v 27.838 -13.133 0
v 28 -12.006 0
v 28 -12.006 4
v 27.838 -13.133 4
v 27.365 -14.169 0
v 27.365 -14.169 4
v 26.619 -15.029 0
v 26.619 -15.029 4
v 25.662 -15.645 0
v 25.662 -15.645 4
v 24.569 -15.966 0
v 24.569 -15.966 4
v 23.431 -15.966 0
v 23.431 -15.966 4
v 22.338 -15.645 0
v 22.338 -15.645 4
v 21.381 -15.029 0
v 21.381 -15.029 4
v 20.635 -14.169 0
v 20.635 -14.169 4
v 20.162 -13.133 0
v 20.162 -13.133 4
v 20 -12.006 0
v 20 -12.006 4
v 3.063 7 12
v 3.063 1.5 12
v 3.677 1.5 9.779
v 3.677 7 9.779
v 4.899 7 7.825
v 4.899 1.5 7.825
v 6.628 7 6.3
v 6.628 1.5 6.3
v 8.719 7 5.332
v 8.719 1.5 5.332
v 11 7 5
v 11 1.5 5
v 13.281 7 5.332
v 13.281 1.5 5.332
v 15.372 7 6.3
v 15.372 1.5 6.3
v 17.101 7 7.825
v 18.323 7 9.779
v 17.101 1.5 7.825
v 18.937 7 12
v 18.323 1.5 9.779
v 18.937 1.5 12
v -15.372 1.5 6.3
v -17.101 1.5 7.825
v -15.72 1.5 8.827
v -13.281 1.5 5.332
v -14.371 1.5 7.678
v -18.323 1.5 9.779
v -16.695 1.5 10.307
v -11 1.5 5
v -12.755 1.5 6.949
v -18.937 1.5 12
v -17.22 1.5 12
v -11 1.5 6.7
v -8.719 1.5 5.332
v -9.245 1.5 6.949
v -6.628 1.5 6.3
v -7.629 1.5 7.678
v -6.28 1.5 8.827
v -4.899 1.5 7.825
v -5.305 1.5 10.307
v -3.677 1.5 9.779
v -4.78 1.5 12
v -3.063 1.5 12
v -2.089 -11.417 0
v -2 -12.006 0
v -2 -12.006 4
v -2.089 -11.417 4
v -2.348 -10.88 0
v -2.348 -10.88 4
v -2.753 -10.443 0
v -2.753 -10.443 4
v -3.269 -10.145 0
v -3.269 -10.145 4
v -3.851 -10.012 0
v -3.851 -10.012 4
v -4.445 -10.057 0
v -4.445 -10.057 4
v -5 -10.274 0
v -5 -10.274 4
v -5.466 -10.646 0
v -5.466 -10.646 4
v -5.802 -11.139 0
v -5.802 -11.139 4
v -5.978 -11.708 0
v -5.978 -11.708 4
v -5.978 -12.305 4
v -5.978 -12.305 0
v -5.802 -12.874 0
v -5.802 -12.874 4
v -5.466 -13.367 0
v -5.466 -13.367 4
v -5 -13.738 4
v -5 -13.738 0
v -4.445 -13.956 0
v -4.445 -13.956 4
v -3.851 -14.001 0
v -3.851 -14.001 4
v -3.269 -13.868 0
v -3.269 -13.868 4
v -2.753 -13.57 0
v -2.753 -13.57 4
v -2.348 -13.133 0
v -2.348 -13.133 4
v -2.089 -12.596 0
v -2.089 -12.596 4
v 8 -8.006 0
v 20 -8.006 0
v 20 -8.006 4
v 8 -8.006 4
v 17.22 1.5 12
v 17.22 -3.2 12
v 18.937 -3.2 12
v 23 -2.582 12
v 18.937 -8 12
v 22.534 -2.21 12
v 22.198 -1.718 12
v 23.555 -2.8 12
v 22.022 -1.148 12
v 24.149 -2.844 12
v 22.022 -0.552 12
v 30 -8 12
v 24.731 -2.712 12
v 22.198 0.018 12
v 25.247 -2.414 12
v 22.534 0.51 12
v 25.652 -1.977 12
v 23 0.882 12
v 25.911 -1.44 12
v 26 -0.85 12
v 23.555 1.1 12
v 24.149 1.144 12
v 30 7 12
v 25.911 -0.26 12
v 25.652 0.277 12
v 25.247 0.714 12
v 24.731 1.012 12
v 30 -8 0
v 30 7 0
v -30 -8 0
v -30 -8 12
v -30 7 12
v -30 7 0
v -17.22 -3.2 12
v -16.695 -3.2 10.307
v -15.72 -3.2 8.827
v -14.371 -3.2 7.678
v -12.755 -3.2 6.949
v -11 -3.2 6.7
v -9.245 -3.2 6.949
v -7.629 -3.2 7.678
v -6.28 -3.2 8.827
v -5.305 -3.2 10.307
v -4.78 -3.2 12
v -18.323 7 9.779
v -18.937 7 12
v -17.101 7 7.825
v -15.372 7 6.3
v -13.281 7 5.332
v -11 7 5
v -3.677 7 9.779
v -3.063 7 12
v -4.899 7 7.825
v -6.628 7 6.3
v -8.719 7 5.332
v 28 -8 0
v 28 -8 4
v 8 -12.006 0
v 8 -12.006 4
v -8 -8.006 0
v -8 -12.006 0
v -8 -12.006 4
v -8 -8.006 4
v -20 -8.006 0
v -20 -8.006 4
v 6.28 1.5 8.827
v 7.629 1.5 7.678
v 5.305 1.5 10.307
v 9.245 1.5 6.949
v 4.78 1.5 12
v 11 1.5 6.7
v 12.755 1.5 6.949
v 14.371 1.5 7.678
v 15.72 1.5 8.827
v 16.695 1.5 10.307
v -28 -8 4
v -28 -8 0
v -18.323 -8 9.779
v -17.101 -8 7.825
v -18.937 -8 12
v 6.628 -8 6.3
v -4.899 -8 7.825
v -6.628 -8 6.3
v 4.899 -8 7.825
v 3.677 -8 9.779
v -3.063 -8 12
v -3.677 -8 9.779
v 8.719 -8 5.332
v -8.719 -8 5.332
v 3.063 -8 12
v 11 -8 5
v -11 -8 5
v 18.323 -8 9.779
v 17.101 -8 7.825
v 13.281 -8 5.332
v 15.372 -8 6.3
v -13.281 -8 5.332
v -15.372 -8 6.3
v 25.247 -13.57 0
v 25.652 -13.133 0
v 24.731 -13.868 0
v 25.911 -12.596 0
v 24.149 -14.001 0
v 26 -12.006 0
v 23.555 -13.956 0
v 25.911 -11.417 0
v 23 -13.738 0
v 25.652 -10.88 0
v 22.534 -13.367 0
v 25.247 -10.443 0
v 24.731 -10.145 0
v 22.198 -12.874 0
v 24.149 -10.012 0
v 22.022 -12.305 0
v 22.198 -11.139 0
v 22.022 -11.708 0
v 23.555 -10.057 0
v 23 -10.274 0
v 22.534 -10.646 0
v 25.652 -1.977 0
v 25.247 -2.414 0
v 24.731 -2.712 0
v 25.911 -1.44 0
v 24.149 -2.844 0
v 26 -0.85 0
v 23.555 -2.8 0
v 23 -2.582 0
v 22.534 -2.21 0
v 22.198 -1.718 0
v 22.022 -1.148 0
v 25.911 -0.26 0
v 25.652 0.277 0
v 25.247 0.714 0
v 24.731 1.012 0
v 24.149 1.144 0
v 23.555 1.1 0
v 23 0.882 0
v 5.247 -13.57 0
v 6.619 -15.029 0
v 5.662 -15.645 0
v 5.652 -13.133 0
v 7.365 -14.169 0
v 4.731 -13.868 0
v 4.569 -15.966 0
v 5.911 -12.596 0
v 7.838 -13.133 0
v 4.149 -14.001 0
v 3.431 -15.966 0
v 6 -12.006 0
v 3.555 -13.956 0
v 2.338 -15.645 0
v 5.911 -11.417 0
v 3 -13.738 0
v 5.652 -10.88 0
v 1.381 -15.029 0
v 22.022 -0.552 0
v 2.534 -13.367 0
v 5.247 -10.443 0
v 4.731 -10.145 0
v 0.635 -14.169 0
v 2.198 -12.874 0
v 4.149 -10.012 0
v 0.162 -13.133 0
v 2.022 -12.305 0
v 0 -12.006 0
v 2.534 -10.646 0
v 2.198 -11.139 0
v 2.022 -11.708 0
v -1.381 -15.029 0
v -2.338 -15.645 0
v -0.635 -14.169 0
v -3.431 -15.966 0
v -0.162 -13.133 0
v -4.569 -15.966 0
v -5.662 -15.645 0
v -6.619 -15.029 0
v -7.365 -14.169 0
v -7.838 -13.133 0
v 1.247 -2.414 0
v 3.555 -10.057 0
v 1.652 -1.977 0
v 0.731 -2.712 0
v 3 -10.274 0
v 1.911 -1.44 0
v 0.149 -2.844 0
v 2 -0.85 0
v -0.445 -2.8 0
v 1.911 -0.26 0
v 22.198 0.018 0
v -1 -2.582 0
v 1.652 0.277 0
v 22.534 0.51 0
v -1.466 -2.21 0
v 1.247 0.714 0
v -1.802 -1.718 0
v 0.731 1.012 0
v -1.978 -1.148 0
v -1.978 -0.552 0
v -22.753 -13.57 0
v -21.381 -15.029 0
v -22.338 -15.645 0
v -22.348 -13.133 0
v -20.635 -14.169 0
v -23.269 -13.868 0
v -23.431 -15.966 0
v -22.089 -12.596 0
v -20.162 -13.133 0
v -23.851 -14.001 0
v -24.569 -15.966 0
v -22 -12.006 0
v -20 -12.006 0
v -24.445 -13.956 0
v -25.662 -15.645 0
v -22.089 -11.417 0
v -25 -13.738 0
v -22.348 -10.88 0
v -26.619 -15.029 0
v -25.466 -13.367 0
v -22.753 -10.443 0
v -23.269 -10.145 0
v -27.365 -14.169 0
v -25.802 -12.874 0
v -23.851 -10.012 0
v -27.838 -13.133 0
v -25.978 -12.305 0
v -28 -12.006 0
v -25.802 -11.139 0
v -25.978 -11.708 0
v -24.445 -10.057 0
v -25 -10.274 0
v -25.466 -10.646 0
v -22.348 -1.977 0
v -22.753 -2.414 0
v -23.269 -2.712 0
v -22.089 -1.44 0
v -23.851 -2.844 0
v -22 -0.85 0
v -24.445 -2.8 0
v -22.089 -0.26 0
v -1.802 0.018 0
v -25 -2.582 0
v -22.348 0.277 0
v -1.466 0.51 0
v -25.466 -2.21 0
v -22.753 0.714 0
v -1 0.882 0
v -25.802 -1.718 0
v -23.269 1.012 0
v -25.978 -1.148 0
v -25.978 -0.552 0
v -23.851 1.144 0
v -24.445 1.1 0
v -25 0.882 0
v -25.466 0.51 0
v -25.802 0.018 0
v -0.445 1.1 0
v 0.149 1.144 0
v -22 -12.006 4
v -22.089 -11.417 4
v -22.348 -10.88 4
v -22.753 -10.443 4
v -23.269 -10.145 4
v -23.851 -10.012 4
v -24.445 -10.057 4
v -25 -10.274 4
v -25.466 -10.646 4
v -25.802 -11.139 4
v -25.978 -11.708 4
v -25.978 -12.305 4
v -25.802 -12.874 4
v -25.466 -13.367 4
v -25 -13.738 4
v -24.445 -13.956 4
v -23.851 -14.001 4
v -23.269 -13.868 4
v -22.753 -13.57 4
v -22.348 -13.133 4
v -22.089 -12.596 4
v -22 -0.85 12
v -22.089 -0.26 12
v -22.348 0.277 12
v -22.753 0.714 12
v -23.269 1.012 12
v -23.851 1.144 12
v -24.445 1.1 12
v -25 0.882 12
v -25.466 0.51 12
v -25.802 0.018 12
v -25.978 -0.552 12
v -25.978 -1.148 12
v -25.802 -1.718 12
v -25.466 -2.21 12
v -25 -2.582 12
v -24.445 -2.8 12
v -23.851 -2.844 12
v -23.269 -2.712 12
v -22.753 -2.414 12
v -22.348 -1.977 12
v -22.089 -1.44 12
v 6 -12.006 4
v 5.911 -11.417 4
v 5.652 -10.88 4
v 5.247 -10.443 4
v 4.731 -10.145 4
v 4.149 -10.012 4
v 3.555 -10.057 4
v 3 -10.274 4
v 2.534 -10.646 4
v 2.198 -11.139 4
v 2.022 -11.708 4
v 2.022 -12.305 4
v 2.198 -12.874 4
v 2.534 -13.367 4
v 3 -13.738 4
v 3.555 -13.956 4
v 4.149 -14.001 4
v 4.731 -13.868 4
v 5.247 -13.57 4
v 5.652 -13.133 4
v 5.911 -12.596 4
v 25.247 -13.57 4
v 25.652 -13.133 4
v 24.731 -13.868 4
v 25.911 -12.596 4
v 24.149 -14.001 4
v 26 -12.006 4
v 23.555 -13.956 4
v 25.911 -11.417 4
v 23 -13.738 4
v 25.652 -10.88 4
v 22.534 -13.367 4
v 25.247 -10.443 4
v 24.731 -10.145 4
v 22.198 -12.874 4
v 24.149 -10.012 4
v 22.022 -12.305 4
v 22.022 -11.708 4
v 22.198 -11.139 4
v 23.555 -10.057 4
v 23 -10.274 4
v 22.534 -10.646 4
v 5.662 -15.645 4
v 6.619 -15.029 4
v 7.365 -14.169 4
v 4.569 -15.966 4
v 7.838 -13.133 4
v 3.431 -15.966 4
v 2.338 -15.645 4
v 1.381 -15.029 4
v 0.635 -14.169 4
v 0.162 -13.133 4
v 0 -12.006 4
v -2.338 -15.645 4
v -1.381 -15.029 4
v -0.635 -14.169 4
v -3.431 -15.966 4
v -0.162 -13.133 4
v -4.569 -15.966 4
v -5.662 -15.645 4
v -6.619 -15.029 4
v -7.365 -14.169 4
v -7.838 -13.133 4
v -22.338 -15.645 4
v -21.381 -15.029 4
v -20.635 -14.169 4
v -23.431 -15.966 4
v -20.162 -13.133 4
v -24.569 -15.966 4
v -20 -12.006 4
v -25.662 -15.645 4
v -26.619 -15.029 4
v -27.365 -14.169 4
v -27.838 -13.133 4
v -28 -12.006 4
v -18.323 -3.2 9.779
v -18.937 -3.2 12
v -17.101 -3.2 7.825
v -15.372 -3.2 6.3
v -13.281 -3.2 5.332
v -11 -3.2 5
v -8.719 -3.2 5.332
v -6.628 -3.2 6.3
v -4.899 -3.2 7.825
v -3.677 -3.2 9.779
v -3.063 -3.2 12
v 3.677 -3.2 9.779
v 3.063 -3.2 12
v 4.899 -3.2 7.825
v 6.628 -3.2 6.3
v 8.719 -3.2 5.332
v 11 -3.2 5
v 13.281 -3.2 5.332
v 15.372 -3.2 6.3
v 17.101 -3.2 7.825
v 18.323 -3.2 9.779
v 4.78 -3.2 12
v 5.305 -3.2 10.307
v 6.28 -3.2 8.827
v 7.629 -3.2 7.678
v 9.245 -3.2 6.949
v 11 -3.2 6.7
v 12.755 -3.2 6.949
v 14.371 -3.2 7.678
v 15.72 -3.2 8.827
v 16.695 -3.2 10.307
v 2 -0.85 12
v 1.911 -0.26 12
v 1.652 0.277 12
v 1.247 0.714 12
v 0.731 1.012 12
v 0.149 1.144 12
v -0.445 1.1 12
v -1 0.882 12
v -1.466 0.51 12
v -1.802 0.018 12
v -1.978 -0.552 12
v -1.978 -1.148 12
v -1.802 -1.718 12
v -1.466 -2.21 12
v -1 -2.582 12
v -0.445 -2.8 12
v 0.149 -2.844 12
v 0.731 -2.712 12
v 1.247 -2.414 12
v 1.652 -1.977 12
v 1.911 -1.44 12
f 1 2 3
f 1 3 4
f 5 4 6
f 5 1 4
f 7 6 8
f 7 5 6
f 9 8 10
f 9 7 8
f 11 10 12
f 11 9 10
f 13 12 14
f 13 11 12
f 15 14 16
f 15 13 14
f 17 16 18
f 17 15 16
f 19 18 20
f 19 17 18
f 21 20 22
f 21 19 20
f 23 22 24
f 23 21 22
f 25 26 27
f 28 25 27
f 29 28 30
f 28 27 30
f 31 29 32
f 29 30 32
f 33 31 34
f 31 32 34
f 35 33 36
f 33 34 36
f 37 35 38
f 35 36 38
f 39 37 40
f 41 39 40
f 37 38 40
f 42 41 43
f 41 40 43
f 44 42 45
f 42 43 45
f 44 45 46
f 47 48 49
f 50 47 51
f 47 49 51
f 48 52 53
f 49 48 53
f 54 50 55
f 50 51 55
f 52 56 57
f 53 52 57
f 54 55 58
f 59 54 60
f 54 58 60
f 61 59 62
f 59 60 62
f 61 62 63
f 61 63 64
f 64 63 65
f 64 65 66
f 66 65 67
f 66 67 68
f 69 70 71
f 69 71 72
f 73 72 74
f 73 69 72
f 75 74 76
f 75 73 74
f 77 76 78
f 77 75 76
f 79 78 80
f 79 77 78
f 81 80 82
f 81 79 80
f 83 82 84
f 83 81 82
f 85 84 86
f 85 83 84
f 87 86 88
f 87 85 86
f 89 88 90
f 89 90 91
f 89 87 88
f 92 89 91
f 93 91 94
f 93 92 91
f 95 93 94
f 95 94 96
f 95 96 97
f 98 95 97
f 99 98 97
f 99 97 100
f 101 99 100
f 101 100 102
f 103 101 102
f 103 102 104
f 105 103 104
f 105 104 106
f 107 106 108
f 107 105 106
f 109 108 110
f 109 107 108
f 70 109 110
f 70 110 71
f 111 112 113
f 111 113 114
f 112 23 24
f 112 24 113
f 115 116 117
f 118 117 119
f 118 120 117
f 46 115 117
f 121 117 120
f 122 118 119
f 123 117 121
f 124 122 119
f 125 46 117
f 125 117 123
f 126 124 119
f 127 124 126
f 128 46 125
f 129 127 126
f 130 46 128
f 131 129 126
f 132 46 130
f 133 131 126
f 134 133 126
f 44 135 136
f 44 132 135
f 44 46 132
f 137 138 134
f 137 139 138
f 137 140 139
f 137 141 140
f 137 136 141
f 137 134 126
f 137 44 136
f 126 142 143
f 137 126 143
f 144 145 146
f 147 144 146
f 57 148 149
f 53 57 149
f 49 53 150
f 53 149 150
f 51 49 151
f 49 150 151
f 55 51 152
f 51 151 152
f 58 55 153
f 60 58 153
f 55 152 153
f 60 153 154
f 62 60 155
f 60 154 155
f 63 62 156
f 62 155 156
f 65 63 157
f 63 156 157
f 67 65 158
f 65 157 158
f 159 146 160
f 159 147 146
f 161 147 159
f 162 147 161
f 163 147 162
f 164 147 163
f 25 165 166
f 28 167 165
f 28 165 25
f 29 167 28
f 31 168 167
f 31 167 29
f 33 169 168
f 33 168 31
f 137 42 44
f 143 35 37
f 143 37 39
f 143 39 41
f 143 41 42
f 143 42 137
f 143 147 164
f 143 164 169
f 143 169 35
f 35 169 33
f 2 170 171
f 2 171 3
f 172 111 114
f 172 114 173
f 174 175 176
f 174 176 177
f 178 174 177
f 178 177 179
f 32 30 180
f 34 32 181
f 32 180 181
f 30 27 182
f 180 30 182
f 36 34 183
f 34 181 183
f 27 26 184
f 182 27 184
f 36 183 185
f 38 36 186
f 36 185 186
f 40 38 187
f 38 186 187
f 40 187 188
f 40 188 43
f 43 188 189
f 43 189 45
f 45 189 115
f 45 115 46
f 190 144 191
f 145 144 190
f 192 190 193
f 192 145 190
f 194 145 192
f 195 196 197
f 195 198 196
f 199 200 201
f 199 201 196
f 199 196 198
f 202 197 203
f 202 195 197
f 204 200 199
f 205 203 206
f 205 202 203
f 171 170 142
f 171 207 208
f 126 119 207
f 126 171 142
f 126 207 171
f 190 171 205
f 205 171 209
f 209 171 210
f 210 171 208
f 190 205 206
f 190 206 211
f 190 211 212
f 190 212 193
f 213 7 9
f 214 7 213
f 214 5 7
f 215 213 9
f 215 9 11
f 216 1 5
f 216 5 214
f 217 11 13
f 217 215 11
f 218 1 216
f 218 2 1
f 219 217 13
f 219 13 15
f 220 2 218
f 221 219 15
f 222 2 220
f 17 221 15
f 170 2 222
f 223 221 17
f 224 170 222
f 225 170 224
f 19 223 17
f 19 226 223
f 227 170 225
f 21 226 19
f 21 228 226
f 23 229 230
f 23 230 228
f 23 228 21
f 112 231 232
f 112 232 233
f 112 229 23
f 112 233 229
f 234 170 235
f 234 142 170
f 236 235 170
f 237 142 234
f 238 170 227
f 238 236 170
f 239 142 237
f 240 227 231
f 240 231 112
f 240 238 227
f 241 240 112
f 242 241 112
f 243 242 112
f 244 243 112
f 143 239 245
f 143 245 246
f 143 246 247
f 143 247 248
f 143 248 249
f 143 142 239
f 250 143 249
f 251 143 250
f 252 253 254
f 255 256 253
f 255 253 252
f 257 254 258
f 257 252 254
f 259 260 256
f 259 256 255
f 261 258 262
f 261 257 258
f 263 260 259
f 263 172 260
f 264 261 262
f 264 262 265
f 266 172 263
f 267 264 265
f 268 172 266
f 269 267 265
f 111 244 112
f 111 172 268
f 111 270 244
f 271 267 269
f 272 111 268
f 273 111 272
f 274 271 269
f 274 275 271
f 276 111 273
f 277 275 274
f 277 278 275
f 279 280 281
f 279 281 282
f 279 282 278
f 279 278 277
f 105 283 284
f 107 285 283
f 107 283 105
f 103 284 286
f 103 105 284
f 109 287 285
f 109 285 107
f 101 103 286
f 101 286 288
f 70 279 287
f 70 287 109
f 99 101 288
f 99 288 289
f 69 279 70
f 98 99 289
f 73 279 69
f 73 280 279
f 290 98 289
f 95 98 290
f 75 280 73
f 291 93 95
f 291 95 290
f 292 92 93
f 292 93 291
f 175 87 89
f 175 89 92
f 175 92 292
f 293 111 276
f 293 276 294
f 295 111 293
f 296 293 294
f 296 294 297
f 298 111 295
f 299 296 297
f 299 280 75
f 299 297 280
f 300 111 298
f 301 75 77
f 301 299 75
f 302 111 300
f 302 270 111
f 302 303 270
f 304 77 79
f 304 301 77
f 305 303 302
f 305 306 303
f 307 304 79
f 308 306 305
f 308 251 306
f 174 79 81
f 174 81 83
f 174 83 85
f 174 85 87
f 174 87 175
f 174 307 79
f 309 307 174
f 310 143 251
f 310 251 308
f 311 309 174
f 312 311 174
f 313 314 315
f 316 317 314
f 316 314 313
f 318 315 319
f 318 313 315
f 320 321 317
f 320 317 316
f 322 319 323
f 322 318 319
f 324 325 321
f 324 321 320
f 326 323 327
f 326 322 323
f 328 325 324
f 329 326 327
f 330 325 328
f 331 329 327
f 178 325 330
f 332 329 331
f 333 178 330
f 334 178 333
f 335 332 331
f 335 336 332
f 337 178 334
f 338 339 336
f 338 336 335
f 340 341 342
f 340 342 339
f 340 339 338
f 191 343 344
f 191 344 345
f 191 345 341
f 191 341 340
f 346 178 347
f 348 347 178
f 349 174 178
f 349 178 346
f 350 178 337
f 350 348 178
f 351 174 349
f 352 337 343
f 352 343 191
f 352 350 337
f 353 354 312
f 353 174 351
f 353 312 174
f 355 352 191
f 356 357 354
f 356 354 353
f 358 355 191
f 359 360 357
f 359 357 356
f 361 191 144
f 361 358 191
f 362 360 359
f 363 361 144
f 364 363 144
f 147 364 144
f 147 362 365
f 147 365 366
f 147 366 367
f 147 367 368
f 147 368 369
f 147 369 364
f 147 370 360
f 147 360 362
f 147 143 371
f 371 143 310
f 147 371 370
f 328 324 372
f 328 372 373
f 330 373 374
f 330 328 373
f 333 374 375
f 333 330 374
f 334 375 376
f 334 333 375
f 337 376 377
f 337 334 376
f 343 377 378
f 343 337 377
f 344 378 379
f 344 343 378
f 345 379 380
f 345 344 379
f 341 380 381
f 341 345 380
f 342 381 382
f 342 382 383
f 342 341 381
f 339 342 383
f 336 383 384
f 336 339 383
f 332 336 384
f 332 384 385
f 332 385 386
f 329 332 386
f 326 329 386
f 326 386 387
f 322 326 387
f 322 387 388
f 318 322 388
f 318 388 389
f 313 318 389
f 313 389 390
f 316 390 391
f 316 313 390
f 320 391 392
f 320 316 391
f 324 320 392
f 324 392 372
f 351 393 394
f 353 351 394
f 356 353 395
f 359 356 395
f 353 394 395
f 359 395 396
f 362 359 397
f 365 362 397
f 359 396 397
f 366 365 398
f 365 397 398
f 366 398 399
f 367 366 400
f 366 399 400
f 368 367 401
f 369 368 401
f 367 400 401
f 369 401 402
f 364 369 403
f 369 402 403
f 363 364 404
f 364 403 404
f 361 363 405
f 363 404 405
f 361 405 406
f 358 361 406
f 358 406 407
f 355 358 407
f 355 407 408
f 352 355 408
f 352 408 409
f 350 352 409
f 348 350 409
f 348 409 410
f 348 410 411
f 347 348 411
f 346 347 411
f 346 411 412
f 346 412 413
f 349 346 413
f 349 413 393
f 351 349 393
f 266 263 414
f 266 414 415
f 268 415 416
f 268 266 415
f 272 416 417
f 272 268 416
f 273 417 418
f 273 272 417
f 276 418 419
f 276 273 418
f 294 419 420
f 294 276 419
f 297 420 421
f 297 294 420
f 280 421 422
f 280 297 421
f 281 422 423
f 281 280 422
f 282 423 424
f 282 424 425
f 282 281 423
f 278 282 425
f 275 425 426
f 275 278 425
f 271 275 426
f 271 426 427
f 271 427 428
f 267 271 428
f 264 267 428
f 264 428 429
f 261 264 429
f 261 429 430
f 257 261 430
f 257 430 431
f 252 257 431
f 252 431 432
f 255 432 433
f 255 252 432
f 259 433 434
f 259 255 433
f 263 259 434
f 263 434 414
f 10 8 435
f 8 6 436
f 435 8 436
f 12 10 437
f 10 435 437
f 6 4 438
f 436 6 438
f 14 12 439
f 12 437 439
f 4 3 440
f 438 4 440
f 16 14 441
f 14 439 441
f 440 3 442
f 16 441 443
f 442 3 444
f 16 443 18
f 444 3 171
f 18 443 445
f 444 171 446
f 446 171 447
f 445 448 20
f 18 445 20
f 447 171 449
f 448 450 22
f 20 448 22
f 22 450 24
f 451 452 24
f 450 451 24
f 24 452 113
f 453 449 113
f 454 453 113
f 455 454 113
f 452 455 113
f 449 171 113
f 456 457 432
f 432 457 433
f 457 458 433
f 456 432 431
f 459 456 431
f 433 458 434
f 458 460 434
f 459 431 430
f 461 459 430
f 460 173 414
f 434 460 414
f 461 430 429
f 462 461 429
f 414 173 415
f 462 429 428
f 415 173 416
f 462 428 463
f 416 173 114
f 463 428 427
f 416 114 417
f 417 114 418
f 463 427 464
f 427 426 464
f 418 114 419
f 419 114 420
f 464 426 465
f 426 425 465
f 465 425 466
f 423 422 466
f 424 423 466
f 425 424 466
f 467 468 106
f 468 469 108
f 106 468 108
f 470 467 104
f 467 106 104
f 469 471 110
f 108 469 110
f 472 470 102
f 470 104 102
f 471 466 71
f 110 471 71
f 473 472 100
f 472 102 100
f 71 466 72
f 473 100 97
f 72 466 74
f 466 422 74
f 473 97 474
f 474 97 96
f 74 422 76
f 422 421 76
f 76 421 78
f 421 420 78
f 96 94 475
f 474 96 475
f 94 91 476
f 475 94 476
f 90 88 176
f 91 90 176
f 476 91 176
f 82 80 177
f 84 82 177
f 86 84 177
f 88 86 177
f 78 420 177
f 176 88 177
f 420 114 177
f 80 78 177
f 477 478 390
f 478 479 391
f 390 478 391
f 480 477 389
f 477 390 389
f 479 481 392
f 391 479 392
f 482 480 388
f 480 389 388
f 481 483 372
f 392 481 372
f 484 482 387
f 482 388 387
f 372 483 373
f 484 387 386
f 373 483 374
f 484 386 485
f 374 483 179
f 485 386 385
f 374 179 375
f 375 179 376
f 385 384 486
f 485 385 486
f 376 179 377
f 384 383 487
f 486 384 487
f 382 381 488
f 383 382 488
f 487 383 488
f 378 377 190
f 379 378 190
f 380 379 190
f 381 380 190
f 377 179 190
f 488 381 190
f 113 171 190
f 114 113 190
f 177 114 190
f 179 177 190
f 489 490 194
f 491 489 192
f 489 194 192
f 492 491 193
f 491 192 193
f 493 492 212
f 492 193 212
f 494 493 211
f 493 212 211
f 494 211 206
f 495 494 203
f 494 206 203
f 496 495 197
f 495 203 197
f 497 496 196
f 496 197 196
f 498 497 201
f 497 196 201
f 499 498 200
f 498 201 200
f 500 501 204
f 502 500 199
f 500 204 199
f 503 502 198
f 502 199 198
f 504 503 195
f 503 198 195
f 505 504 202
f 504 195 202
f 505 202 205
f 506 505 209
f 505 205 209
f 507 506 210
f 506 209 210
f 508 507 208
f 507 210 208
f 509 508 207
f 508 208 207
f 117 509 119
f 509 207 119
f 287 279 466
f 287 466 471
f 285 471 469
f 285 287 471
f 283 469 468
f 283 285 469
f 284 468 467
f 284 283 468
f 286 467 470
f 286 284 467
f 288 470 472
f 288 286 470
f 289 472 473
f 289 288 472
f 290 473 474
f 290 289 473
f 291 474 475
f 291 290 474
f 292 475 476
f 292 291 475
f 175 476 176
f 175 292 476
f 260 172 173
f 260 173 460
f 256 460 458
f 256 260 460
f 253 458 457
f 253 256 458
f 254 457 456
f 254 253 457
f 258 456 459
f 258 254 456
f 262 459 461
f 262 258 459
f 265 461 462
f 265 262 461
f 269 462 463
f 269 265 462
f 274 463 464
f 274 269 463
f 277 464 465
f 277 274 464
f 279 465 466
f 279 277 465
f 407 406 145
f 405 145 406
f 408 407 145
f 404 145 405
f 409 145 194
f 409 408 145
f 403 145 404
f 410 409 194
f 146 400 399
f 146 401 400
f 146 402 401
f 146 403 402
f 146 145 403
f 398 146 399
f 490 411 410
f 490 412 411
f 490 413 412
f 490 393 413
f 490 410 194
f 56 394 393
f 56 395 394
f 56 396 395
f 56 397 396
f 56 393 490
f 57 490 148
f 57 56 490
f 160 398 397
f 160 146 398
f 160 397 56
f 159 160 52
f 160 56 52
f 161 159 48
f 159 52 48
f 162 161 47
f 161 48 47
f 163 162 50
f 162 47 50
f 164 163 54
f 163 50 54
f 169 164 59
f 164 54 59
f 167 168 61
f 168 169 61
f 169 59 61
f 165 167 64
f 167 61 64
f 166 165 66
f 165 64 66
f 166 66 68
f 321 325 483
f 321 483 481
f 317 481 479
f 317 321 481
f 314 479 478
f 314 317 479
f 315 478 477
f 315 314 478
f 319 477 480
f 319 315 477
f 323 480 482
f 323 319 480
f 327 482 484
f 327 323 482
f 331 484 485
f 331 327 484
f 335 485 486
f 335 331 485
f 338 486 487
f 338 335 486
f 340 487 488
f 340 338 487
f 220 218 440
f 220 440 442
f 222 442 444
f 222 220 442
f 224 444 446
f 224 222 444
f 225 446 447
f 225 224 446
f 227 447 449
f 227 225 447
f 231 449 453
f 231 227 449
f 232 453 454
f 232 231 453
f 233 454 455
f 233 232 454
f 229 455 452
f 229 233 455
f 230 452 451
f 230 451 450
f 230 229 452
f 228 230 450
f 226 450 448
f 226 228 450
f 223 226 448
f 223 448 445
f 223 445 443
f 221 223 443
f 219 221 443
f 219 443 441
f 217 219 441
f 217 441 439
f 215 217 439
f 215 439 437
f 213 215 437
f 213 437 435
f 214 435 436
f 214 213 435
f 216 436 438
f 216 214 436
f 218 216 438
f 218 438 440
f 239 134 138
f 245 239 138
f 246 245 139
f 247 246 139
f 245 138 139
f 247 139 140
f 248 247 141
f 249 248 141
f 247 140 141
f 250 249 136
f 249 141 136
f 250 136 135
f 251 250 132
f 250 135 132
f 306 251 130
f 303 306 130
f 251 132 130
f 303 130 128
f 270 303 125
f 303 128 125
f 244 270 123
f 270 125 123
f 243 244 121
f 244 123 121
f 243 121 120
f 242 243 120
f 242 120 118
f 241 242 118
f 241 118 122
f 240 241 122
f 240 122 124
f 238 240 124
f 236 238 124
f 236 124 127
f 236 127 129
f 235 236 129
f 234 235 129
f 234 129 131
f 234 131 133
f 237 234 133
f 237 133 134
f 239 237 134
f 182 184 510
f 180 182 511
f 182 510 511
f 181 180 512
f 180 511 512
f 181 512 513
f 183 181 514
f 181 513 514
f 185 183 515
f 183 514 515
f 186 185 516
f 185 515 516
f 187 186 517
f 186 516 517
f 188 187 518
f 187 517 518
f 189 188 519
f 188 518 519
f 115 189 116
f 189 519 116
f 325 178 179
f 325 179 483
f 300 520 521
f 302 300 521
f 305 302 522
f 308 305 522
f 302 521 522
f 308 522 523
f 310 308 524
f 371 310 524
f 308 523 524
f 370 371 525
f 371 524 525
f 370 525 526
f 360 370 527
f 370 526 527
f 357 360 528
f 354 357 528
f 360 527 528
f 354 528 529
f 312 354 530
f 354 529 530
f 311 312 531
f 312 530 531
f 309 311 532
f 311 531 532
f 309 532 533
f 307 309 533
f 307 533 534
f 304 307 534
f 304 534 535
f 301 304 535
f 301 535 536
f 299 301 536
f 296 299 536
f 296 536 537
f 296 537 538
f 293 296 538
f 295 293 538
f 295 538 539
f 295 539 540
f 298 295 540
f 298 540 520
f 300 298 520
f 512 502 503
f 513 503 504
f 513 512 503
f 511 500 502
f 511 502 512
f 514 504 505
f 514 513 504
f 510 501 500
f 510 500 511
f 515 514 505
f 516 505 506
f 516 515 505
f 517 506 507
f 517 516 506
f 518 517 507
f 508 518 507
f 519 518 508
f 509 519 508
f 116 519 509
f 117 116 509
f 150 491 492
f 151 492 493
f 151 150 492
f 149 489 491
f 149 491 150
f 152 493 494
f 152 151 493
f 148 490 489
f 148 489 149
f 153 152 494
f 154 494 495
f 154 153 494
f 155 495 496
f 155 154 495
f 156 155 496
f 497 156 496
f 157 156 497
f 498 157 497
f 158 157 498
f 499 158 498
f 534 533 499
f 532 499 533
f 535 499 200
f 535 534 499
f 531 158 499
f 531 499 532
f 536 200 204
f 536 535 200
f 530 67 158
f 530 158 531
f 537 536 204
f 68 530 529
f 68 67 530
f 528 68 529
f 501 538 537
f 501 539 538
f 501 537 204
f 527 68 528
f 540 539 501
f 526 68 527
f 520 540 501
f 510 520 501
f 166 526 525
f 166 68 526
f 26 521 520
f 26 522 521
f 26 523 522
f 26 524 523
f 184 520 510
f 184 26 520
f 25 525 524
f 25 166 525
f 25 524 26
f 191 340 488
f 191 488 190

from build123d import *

# Parameters (mm, degrees)
SCHIZZO1_W                   = 60
SCHIZZO1_H                   = 30
ESTRUSIONE_ESTRUSIONE1_DEPTH = 5
SCHIZZO2_W                   = 60
SCHIZZO2_H                   = 8
ESTRUSIONE_ESTRUSIONE2_DEPTH = 20
SCHIZZO3_R                   = 5
TAGLIO_ESTRUSIONE1_DEPTH     = 8
RACCORDO1_R                  = 20
SCHIZZO4_W                   = 60
SCHIZZO4_H                   = 15
ESTRUSIONE_ESTRUSIONE3_DEPTH = 10
SCHIZZO6_R                   = 8
TAGLIO_ESTRUSIONE2_DEPTH     = 15
SCHIZZO8_W                   = 60
SCHIZZO8_H                   = 4.7
ESTRUSIONE_ESTRUSIONE4_DEPTH = 10
SCHIZZO9_R                   = 6.3
TAGLIO_ESTRUSIONE3_DEPTH     = 5
SCHIZZO10_R                  = 2
TAGLIO_ESTRUSIONE4_DEPTH     = 16
SCHIZZO11_W                  = 60
SCHIZZO11_H                  = 8
TAGLIO_ESTRUSIONE5_DEPTH     = 25
SCHIZZO14_W                  = 60
SCHIZZO14_H                  = 5
TAGLIO_ESTRUSIONE7_DEPTH     = 7
SCHIZZO12_R                  = 2
ESTRUSIONE_ESTRUSIONE5_DEPTH = 4
SCHIZZO17_W                  = 60
SCHIZZO17_H                  = 15
TAGLIO_ESTRUSIONE9_DEPTH     = 3


with BuildPart() as part:
    # Schizzo1 → Estrusione-Estrusione1 (new body)
    with BuildSketch(Plane.XY):
        Rectangle(SCHIZZO1_W, SCHIZZO1_H)
    extrude(amount=ESTRUSIONE_ESTRUSIONE1_DEPTH)

    # Schizzo2 → Estrusione-Estrusione2 (add)
    with BuildSketch(Plane.XY.offset(5)):
        with Locations((0, 11)):
            Rectangle(SCHIZZO2_W, SCHIZZO2_H)
    extrude(amount=ESTRUSIONE_ESTRUSIONE2_DEPTH)

    # Schizzo3 → Taglio-Estrusione1 (cut)
    with BuildSketch(Plane(origin=(0, 15, 0), x_dir=(1, 0, 0), z_dir=(0, 1, 0))):
        with Locations((11, -13)):
            Circle(SCHIZZO3_R)
        with Locations((-11, -13)):
            Circle(SCHIZZO3_R)
    extrude(amount=-TAGLIO_ESTRUSIONE1_DEPTH, mode=Mode.SUBTRACT)

    # Raccordo1
    raccordo1_edges = [part.edges().sort_by_distance(p)[0] for p in [
        (30, 11, 25),
        (-30, 11, 25),
    ]]
    fillet(raccordo1_edges, radius=RACCORDO1_R)

    # Schizzo4 → Estrusione-Estrusione3 (add)
    with BuildSketch(Plane.XY.offset(5)):
        with Locations((0, -0.5)):
            Rectangle(SCHIZZO4_W, SCHIZZO4_H)
    extrude(amount=ESTRUSIONE_ESTRUSIONE3_DEPTH)

    # Schizzo6 → Taglio-Estrusione2 (cut)
    with BuildSketch(Plane.XZ.offset(8)):
        with Locations((-11, 13)):
            Circle(SCHIZZO6_R)
        with Locations((11, 13)):
            Circle(SCHIZZO6_R)
    extrude(amount=-TAGLIO_ESTRUSIONE2_DEPTH, mode=Mode.SUBTRACT)

    # Schizzo8 → Estrusione-Estrusione4 (add)
    with BuildSketch(Plane.XY.offset(15)):
        with Locations((0, -0.85)):
            Rectangle(SCHIZZO8_W, SCHIZZO8_H)
    extrude(amount=-ESTRUSIONE_ESTRUSIONE4_DEPTH)

    # Schizzo9 → Taglio-Estrusione3 (cut)
    with BuildSketch(Plane.XZ.offset(3.2)):
        with Locations((-11, 13)):
            Circle(SCHIZZO9_R)
        with Locations((11, 13)):
            Circle(SCHIZZO9_R)
    extrude(amount=-TAGLIO_ESTRUSIONE3_DEPTH, mode=Mode.SUBTRACT)

    # Schizzo10 → Taglio-Estrusione4 (cut, through all)
    with BuildSketch(Plane.XY.offset(15)):
        with Locations((0, -0.85)):
            Circle(SCHIZZO10_R)
        with Locations((24, -0.85)):
            Circle(SCHIZZO10_R)
        with Locations((-24, -0.85)):
            Circle(SCHIZZO10_R)
    extrude(amount=-TAGLIO_ESTRUSIONE4_DEPTH, mode=Mode.SUBTRACT)

    # Schizzo11 → Taglio-Estrusione5 (cut)
    with BuildSketch(Plane(origin=(0, 0, 0), x_dir=(-1, 0, 0), z_dir=(0, 0, -1))):
        with Locations((0, 11)):
            Rectangle(SCHIZZO11_W, SCHIZZO11_H)
    extrude(amount=-TAGLIO_ESTRUSIONE5_DEPTH, mode=Mode.SUBTRACT)

    # Schizzo14 → Taglio-Estrusione7 (cut)
    with BuildSketch(Plane.XZ.offset(15)):
        with Locations((0, 2.5)):
            Rectangle(SCHIZZO14_W, SCHIZZO14_H)
    extrude(amount=-TAGLIO_ESTRUSIONE7_DEPTH, mode=Mode.SUBTRACT)

    # Schizzo12 → Estrusione-Estrusione5 (add)
    with BuildSketch(Plane.XY):
        with BuildLine():
            Line((-28, -12.006435696), (-28, -5.256435696))
            Line((-28, -5.256435696), (28, -5.256435696))
            Line((28, -5.256435696), (28, -12.006435696))
            ThreePointArc((28, -12.006435696), (24, -16.006435696), (20, -12.006435696))
            Line((20, -12.006435696), (20, -8.006435696))
            Line((20, -8.006435696), (8, -8.006435696))
            Line((8, -8.006435696), (8, -12.006435696))
            ThreePointArc((8, -12.006435696), (4, -16.006435696), (0, -12.006435696))
            ThreePointArc((0, -12.006435696), (-4, -16.006435696), (-8, -12.006435696))
            Line((-8, -12.006435696), (-8, -8.006435696))
            Line((-8, -8.006435696), (-20, -8.006435696))
            Line((-20, -8.006435696), (-20, -12.006435696))
            ThreePointArc((-20, -12.006435696), (-24, -16.006435696), (-28, -12.006435696))
        make_face()
        with Locations((24, -12.006435696)):
            Circle(SCHIZZO12_R, mode=Mode.SUBTRACT)
        with Locations((-24, -12.006435696)):
            Circle(SCHIZZO12_R, mode=Mode.SUBTRACT)
        with Locations((4, -12.006435696)):
            Circle(SCHIZZO12_R, mode=Mode.SUBTRACT)
        with Locations((-4, -12.006435696)):
            Circle(SCHIZZO12_R, mode=Mode.SUBTRACT)
    extrude(amount=ESTRUSIONE_ESTRUSIONE5_DEPTH)

    # Schizzo17 → Taglio-Estrusione9 (cut)
    with BuildSketch(Plane.XY.offset(15)):
        with Locations((0, -0.5)):
            Rectangle(SCHIZZO17_W, SCHIZZO17_H)
    extrude(amount=-TAGLIO_ESTRUSIONE9_DEPTH, mode=Mode.SUBTRACT)


solid = part.part
